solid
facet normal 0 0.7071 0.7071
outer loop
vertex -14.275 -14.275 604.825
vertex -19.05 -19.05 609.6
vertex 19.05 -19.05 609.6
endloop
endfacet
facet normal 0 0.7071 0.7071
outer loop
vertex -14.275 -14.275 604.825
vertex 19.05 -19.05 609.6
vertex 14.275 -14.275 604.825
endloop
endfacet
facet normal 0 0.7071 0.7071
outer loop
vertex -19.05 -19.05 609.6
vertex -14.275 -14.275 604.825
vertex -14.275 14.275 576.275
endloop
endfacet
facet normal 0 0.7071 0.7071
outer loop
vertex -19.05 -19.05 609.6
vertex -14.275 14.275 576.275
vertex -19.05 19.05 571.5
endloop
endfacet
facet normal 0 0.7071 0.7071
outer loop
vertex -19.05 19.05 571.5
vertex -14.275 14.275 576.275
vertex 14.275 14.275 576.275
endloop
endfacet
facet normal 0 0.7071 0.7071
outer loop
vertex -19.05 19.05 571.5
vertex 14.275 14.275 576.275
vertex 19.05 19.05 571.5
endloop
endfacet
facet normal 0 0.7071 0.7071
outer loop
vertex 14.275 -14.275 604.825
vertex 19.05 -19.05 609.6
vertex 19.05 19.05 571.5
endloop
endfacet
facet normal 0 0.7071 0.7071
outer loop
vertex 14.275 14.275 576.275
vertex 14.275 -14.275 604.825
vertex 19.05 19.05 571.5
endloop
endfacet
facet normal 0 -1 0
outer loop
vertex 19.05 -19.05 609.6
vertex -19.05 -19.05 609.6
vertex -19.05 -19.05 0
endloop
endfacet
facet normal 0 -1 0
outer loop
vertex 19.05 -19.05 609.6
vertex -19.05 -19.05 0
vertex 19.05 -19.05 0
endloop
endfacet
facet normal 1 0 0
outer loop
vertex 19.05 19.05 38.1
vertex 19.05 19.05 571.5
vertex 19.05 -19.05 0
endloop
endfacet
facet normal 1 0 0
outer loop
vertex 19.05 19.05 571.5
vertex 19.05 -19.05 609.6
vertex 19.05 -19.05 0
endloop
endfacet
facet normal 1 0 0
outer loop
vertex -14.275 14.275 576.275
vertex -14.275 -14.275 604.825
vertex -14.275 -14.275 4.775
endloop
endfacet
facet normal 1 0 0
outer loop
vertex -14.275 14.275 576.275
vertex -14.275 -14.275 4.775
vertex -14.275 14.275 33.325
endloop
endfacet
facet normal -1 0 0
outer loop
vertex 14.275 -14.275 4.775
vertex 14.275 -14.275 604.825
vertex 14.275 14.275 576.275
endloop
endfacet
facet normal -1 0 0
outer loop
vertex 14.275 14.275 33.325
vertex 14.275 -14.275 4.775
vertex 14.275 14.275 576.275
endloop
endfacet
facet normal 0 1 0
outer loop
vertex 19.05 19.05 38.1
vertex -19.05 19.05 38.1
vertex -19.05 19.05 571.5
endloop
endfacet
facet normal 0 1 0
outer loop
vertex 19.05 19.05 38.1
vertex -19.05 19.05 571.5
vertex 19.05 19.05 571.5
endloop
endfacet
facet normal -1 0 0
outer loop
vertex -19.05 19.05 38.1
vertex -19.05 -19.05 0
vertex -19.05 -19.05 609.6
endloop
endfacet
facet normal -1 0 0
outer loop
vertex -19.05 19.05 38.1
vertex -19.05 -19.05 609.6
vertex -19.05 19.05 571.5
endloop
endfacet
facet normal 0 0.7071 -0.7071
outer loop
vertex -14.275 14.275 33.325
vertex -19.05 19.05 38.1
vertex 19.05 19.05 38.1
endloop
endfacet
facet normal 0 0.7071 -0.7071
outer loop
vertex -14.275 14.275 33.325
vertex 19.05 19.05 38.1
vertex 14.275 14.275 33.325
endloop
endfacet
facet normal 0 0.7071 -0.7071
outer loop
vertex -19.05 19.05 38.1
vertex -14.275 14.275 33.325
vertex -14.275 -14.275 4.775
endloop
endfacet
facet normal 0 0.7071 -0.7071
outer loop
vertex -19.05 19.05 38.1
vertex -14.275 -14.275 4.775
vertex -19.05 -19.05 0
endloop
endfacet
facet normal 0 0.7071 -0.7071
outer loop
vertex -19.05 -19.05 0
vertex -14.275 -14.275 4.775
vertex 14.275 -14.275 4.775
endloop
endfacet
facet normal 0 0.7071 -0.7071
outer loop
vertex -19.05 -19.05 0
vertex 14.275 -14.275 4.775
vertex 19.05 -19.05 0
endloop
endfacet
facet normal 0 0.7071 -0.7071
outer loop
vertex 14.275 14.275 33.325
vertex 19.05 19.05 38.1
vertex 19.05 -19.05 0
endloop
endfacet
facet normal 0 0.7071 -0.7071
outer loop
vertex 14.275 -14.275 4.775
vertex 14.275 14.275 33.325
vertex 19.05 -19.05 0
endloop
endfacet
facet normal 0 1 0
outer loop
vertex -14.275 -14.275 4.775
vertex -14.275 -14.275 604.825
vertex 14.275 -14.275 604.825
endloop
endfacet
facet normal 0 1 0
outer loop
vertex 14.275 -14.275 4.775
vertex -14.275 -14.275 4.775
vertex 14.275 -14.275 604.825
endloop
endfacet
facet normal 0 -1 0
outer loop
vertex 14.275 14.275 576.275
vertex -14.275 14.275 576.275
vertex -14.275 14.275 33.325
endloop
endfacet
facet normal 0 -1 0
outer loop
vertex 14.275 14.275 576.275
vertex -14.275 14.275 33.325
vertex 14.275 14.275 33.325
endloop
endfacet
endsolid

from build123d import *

# Parameters (mm, degrees)
F0_W     = 38.1
F0_H     = 38.1
F0_W_2   = 28.5496
F0_H_2   = 28.5496
F1_DEPTH = 609.6
F3_DEPTH = 38.101
F4_DEPTH = 38.101


with BuildPart() as f1:
    # F0 (on Top) → F1 (new body)
    with BuildSketch(Plane.XY):
        Rectangle(F0_W, F0_H)
        Rectangle(F0_W_2, F0_H_2, mode=Mode.SUBTRACT)
    extrude(amount=F1_DEPTH)

    # F2 (on face) → F3 (cut, through all)
    with BuildSketch(Plane.YZ.offset(19.05)):
        Polygon((19.05, 38.1), (-19.05, 0), (19.05, 0), align=None)
    extrude(amount=-F3_DEPTH, mode=Mode.SUBTRACT)

    # F2 (on face) → F4 (cut, through all)
    with BuildSketch(Plane.YZ.offset(19.05)):
        Polygon((19.05, 609.6), (-19.05, 609.6), (19.05, 571.5), align=None)
    extrude(amount=-F4_DEPTH, mode=Mode.SUBTRACT)


solid = f1.part
